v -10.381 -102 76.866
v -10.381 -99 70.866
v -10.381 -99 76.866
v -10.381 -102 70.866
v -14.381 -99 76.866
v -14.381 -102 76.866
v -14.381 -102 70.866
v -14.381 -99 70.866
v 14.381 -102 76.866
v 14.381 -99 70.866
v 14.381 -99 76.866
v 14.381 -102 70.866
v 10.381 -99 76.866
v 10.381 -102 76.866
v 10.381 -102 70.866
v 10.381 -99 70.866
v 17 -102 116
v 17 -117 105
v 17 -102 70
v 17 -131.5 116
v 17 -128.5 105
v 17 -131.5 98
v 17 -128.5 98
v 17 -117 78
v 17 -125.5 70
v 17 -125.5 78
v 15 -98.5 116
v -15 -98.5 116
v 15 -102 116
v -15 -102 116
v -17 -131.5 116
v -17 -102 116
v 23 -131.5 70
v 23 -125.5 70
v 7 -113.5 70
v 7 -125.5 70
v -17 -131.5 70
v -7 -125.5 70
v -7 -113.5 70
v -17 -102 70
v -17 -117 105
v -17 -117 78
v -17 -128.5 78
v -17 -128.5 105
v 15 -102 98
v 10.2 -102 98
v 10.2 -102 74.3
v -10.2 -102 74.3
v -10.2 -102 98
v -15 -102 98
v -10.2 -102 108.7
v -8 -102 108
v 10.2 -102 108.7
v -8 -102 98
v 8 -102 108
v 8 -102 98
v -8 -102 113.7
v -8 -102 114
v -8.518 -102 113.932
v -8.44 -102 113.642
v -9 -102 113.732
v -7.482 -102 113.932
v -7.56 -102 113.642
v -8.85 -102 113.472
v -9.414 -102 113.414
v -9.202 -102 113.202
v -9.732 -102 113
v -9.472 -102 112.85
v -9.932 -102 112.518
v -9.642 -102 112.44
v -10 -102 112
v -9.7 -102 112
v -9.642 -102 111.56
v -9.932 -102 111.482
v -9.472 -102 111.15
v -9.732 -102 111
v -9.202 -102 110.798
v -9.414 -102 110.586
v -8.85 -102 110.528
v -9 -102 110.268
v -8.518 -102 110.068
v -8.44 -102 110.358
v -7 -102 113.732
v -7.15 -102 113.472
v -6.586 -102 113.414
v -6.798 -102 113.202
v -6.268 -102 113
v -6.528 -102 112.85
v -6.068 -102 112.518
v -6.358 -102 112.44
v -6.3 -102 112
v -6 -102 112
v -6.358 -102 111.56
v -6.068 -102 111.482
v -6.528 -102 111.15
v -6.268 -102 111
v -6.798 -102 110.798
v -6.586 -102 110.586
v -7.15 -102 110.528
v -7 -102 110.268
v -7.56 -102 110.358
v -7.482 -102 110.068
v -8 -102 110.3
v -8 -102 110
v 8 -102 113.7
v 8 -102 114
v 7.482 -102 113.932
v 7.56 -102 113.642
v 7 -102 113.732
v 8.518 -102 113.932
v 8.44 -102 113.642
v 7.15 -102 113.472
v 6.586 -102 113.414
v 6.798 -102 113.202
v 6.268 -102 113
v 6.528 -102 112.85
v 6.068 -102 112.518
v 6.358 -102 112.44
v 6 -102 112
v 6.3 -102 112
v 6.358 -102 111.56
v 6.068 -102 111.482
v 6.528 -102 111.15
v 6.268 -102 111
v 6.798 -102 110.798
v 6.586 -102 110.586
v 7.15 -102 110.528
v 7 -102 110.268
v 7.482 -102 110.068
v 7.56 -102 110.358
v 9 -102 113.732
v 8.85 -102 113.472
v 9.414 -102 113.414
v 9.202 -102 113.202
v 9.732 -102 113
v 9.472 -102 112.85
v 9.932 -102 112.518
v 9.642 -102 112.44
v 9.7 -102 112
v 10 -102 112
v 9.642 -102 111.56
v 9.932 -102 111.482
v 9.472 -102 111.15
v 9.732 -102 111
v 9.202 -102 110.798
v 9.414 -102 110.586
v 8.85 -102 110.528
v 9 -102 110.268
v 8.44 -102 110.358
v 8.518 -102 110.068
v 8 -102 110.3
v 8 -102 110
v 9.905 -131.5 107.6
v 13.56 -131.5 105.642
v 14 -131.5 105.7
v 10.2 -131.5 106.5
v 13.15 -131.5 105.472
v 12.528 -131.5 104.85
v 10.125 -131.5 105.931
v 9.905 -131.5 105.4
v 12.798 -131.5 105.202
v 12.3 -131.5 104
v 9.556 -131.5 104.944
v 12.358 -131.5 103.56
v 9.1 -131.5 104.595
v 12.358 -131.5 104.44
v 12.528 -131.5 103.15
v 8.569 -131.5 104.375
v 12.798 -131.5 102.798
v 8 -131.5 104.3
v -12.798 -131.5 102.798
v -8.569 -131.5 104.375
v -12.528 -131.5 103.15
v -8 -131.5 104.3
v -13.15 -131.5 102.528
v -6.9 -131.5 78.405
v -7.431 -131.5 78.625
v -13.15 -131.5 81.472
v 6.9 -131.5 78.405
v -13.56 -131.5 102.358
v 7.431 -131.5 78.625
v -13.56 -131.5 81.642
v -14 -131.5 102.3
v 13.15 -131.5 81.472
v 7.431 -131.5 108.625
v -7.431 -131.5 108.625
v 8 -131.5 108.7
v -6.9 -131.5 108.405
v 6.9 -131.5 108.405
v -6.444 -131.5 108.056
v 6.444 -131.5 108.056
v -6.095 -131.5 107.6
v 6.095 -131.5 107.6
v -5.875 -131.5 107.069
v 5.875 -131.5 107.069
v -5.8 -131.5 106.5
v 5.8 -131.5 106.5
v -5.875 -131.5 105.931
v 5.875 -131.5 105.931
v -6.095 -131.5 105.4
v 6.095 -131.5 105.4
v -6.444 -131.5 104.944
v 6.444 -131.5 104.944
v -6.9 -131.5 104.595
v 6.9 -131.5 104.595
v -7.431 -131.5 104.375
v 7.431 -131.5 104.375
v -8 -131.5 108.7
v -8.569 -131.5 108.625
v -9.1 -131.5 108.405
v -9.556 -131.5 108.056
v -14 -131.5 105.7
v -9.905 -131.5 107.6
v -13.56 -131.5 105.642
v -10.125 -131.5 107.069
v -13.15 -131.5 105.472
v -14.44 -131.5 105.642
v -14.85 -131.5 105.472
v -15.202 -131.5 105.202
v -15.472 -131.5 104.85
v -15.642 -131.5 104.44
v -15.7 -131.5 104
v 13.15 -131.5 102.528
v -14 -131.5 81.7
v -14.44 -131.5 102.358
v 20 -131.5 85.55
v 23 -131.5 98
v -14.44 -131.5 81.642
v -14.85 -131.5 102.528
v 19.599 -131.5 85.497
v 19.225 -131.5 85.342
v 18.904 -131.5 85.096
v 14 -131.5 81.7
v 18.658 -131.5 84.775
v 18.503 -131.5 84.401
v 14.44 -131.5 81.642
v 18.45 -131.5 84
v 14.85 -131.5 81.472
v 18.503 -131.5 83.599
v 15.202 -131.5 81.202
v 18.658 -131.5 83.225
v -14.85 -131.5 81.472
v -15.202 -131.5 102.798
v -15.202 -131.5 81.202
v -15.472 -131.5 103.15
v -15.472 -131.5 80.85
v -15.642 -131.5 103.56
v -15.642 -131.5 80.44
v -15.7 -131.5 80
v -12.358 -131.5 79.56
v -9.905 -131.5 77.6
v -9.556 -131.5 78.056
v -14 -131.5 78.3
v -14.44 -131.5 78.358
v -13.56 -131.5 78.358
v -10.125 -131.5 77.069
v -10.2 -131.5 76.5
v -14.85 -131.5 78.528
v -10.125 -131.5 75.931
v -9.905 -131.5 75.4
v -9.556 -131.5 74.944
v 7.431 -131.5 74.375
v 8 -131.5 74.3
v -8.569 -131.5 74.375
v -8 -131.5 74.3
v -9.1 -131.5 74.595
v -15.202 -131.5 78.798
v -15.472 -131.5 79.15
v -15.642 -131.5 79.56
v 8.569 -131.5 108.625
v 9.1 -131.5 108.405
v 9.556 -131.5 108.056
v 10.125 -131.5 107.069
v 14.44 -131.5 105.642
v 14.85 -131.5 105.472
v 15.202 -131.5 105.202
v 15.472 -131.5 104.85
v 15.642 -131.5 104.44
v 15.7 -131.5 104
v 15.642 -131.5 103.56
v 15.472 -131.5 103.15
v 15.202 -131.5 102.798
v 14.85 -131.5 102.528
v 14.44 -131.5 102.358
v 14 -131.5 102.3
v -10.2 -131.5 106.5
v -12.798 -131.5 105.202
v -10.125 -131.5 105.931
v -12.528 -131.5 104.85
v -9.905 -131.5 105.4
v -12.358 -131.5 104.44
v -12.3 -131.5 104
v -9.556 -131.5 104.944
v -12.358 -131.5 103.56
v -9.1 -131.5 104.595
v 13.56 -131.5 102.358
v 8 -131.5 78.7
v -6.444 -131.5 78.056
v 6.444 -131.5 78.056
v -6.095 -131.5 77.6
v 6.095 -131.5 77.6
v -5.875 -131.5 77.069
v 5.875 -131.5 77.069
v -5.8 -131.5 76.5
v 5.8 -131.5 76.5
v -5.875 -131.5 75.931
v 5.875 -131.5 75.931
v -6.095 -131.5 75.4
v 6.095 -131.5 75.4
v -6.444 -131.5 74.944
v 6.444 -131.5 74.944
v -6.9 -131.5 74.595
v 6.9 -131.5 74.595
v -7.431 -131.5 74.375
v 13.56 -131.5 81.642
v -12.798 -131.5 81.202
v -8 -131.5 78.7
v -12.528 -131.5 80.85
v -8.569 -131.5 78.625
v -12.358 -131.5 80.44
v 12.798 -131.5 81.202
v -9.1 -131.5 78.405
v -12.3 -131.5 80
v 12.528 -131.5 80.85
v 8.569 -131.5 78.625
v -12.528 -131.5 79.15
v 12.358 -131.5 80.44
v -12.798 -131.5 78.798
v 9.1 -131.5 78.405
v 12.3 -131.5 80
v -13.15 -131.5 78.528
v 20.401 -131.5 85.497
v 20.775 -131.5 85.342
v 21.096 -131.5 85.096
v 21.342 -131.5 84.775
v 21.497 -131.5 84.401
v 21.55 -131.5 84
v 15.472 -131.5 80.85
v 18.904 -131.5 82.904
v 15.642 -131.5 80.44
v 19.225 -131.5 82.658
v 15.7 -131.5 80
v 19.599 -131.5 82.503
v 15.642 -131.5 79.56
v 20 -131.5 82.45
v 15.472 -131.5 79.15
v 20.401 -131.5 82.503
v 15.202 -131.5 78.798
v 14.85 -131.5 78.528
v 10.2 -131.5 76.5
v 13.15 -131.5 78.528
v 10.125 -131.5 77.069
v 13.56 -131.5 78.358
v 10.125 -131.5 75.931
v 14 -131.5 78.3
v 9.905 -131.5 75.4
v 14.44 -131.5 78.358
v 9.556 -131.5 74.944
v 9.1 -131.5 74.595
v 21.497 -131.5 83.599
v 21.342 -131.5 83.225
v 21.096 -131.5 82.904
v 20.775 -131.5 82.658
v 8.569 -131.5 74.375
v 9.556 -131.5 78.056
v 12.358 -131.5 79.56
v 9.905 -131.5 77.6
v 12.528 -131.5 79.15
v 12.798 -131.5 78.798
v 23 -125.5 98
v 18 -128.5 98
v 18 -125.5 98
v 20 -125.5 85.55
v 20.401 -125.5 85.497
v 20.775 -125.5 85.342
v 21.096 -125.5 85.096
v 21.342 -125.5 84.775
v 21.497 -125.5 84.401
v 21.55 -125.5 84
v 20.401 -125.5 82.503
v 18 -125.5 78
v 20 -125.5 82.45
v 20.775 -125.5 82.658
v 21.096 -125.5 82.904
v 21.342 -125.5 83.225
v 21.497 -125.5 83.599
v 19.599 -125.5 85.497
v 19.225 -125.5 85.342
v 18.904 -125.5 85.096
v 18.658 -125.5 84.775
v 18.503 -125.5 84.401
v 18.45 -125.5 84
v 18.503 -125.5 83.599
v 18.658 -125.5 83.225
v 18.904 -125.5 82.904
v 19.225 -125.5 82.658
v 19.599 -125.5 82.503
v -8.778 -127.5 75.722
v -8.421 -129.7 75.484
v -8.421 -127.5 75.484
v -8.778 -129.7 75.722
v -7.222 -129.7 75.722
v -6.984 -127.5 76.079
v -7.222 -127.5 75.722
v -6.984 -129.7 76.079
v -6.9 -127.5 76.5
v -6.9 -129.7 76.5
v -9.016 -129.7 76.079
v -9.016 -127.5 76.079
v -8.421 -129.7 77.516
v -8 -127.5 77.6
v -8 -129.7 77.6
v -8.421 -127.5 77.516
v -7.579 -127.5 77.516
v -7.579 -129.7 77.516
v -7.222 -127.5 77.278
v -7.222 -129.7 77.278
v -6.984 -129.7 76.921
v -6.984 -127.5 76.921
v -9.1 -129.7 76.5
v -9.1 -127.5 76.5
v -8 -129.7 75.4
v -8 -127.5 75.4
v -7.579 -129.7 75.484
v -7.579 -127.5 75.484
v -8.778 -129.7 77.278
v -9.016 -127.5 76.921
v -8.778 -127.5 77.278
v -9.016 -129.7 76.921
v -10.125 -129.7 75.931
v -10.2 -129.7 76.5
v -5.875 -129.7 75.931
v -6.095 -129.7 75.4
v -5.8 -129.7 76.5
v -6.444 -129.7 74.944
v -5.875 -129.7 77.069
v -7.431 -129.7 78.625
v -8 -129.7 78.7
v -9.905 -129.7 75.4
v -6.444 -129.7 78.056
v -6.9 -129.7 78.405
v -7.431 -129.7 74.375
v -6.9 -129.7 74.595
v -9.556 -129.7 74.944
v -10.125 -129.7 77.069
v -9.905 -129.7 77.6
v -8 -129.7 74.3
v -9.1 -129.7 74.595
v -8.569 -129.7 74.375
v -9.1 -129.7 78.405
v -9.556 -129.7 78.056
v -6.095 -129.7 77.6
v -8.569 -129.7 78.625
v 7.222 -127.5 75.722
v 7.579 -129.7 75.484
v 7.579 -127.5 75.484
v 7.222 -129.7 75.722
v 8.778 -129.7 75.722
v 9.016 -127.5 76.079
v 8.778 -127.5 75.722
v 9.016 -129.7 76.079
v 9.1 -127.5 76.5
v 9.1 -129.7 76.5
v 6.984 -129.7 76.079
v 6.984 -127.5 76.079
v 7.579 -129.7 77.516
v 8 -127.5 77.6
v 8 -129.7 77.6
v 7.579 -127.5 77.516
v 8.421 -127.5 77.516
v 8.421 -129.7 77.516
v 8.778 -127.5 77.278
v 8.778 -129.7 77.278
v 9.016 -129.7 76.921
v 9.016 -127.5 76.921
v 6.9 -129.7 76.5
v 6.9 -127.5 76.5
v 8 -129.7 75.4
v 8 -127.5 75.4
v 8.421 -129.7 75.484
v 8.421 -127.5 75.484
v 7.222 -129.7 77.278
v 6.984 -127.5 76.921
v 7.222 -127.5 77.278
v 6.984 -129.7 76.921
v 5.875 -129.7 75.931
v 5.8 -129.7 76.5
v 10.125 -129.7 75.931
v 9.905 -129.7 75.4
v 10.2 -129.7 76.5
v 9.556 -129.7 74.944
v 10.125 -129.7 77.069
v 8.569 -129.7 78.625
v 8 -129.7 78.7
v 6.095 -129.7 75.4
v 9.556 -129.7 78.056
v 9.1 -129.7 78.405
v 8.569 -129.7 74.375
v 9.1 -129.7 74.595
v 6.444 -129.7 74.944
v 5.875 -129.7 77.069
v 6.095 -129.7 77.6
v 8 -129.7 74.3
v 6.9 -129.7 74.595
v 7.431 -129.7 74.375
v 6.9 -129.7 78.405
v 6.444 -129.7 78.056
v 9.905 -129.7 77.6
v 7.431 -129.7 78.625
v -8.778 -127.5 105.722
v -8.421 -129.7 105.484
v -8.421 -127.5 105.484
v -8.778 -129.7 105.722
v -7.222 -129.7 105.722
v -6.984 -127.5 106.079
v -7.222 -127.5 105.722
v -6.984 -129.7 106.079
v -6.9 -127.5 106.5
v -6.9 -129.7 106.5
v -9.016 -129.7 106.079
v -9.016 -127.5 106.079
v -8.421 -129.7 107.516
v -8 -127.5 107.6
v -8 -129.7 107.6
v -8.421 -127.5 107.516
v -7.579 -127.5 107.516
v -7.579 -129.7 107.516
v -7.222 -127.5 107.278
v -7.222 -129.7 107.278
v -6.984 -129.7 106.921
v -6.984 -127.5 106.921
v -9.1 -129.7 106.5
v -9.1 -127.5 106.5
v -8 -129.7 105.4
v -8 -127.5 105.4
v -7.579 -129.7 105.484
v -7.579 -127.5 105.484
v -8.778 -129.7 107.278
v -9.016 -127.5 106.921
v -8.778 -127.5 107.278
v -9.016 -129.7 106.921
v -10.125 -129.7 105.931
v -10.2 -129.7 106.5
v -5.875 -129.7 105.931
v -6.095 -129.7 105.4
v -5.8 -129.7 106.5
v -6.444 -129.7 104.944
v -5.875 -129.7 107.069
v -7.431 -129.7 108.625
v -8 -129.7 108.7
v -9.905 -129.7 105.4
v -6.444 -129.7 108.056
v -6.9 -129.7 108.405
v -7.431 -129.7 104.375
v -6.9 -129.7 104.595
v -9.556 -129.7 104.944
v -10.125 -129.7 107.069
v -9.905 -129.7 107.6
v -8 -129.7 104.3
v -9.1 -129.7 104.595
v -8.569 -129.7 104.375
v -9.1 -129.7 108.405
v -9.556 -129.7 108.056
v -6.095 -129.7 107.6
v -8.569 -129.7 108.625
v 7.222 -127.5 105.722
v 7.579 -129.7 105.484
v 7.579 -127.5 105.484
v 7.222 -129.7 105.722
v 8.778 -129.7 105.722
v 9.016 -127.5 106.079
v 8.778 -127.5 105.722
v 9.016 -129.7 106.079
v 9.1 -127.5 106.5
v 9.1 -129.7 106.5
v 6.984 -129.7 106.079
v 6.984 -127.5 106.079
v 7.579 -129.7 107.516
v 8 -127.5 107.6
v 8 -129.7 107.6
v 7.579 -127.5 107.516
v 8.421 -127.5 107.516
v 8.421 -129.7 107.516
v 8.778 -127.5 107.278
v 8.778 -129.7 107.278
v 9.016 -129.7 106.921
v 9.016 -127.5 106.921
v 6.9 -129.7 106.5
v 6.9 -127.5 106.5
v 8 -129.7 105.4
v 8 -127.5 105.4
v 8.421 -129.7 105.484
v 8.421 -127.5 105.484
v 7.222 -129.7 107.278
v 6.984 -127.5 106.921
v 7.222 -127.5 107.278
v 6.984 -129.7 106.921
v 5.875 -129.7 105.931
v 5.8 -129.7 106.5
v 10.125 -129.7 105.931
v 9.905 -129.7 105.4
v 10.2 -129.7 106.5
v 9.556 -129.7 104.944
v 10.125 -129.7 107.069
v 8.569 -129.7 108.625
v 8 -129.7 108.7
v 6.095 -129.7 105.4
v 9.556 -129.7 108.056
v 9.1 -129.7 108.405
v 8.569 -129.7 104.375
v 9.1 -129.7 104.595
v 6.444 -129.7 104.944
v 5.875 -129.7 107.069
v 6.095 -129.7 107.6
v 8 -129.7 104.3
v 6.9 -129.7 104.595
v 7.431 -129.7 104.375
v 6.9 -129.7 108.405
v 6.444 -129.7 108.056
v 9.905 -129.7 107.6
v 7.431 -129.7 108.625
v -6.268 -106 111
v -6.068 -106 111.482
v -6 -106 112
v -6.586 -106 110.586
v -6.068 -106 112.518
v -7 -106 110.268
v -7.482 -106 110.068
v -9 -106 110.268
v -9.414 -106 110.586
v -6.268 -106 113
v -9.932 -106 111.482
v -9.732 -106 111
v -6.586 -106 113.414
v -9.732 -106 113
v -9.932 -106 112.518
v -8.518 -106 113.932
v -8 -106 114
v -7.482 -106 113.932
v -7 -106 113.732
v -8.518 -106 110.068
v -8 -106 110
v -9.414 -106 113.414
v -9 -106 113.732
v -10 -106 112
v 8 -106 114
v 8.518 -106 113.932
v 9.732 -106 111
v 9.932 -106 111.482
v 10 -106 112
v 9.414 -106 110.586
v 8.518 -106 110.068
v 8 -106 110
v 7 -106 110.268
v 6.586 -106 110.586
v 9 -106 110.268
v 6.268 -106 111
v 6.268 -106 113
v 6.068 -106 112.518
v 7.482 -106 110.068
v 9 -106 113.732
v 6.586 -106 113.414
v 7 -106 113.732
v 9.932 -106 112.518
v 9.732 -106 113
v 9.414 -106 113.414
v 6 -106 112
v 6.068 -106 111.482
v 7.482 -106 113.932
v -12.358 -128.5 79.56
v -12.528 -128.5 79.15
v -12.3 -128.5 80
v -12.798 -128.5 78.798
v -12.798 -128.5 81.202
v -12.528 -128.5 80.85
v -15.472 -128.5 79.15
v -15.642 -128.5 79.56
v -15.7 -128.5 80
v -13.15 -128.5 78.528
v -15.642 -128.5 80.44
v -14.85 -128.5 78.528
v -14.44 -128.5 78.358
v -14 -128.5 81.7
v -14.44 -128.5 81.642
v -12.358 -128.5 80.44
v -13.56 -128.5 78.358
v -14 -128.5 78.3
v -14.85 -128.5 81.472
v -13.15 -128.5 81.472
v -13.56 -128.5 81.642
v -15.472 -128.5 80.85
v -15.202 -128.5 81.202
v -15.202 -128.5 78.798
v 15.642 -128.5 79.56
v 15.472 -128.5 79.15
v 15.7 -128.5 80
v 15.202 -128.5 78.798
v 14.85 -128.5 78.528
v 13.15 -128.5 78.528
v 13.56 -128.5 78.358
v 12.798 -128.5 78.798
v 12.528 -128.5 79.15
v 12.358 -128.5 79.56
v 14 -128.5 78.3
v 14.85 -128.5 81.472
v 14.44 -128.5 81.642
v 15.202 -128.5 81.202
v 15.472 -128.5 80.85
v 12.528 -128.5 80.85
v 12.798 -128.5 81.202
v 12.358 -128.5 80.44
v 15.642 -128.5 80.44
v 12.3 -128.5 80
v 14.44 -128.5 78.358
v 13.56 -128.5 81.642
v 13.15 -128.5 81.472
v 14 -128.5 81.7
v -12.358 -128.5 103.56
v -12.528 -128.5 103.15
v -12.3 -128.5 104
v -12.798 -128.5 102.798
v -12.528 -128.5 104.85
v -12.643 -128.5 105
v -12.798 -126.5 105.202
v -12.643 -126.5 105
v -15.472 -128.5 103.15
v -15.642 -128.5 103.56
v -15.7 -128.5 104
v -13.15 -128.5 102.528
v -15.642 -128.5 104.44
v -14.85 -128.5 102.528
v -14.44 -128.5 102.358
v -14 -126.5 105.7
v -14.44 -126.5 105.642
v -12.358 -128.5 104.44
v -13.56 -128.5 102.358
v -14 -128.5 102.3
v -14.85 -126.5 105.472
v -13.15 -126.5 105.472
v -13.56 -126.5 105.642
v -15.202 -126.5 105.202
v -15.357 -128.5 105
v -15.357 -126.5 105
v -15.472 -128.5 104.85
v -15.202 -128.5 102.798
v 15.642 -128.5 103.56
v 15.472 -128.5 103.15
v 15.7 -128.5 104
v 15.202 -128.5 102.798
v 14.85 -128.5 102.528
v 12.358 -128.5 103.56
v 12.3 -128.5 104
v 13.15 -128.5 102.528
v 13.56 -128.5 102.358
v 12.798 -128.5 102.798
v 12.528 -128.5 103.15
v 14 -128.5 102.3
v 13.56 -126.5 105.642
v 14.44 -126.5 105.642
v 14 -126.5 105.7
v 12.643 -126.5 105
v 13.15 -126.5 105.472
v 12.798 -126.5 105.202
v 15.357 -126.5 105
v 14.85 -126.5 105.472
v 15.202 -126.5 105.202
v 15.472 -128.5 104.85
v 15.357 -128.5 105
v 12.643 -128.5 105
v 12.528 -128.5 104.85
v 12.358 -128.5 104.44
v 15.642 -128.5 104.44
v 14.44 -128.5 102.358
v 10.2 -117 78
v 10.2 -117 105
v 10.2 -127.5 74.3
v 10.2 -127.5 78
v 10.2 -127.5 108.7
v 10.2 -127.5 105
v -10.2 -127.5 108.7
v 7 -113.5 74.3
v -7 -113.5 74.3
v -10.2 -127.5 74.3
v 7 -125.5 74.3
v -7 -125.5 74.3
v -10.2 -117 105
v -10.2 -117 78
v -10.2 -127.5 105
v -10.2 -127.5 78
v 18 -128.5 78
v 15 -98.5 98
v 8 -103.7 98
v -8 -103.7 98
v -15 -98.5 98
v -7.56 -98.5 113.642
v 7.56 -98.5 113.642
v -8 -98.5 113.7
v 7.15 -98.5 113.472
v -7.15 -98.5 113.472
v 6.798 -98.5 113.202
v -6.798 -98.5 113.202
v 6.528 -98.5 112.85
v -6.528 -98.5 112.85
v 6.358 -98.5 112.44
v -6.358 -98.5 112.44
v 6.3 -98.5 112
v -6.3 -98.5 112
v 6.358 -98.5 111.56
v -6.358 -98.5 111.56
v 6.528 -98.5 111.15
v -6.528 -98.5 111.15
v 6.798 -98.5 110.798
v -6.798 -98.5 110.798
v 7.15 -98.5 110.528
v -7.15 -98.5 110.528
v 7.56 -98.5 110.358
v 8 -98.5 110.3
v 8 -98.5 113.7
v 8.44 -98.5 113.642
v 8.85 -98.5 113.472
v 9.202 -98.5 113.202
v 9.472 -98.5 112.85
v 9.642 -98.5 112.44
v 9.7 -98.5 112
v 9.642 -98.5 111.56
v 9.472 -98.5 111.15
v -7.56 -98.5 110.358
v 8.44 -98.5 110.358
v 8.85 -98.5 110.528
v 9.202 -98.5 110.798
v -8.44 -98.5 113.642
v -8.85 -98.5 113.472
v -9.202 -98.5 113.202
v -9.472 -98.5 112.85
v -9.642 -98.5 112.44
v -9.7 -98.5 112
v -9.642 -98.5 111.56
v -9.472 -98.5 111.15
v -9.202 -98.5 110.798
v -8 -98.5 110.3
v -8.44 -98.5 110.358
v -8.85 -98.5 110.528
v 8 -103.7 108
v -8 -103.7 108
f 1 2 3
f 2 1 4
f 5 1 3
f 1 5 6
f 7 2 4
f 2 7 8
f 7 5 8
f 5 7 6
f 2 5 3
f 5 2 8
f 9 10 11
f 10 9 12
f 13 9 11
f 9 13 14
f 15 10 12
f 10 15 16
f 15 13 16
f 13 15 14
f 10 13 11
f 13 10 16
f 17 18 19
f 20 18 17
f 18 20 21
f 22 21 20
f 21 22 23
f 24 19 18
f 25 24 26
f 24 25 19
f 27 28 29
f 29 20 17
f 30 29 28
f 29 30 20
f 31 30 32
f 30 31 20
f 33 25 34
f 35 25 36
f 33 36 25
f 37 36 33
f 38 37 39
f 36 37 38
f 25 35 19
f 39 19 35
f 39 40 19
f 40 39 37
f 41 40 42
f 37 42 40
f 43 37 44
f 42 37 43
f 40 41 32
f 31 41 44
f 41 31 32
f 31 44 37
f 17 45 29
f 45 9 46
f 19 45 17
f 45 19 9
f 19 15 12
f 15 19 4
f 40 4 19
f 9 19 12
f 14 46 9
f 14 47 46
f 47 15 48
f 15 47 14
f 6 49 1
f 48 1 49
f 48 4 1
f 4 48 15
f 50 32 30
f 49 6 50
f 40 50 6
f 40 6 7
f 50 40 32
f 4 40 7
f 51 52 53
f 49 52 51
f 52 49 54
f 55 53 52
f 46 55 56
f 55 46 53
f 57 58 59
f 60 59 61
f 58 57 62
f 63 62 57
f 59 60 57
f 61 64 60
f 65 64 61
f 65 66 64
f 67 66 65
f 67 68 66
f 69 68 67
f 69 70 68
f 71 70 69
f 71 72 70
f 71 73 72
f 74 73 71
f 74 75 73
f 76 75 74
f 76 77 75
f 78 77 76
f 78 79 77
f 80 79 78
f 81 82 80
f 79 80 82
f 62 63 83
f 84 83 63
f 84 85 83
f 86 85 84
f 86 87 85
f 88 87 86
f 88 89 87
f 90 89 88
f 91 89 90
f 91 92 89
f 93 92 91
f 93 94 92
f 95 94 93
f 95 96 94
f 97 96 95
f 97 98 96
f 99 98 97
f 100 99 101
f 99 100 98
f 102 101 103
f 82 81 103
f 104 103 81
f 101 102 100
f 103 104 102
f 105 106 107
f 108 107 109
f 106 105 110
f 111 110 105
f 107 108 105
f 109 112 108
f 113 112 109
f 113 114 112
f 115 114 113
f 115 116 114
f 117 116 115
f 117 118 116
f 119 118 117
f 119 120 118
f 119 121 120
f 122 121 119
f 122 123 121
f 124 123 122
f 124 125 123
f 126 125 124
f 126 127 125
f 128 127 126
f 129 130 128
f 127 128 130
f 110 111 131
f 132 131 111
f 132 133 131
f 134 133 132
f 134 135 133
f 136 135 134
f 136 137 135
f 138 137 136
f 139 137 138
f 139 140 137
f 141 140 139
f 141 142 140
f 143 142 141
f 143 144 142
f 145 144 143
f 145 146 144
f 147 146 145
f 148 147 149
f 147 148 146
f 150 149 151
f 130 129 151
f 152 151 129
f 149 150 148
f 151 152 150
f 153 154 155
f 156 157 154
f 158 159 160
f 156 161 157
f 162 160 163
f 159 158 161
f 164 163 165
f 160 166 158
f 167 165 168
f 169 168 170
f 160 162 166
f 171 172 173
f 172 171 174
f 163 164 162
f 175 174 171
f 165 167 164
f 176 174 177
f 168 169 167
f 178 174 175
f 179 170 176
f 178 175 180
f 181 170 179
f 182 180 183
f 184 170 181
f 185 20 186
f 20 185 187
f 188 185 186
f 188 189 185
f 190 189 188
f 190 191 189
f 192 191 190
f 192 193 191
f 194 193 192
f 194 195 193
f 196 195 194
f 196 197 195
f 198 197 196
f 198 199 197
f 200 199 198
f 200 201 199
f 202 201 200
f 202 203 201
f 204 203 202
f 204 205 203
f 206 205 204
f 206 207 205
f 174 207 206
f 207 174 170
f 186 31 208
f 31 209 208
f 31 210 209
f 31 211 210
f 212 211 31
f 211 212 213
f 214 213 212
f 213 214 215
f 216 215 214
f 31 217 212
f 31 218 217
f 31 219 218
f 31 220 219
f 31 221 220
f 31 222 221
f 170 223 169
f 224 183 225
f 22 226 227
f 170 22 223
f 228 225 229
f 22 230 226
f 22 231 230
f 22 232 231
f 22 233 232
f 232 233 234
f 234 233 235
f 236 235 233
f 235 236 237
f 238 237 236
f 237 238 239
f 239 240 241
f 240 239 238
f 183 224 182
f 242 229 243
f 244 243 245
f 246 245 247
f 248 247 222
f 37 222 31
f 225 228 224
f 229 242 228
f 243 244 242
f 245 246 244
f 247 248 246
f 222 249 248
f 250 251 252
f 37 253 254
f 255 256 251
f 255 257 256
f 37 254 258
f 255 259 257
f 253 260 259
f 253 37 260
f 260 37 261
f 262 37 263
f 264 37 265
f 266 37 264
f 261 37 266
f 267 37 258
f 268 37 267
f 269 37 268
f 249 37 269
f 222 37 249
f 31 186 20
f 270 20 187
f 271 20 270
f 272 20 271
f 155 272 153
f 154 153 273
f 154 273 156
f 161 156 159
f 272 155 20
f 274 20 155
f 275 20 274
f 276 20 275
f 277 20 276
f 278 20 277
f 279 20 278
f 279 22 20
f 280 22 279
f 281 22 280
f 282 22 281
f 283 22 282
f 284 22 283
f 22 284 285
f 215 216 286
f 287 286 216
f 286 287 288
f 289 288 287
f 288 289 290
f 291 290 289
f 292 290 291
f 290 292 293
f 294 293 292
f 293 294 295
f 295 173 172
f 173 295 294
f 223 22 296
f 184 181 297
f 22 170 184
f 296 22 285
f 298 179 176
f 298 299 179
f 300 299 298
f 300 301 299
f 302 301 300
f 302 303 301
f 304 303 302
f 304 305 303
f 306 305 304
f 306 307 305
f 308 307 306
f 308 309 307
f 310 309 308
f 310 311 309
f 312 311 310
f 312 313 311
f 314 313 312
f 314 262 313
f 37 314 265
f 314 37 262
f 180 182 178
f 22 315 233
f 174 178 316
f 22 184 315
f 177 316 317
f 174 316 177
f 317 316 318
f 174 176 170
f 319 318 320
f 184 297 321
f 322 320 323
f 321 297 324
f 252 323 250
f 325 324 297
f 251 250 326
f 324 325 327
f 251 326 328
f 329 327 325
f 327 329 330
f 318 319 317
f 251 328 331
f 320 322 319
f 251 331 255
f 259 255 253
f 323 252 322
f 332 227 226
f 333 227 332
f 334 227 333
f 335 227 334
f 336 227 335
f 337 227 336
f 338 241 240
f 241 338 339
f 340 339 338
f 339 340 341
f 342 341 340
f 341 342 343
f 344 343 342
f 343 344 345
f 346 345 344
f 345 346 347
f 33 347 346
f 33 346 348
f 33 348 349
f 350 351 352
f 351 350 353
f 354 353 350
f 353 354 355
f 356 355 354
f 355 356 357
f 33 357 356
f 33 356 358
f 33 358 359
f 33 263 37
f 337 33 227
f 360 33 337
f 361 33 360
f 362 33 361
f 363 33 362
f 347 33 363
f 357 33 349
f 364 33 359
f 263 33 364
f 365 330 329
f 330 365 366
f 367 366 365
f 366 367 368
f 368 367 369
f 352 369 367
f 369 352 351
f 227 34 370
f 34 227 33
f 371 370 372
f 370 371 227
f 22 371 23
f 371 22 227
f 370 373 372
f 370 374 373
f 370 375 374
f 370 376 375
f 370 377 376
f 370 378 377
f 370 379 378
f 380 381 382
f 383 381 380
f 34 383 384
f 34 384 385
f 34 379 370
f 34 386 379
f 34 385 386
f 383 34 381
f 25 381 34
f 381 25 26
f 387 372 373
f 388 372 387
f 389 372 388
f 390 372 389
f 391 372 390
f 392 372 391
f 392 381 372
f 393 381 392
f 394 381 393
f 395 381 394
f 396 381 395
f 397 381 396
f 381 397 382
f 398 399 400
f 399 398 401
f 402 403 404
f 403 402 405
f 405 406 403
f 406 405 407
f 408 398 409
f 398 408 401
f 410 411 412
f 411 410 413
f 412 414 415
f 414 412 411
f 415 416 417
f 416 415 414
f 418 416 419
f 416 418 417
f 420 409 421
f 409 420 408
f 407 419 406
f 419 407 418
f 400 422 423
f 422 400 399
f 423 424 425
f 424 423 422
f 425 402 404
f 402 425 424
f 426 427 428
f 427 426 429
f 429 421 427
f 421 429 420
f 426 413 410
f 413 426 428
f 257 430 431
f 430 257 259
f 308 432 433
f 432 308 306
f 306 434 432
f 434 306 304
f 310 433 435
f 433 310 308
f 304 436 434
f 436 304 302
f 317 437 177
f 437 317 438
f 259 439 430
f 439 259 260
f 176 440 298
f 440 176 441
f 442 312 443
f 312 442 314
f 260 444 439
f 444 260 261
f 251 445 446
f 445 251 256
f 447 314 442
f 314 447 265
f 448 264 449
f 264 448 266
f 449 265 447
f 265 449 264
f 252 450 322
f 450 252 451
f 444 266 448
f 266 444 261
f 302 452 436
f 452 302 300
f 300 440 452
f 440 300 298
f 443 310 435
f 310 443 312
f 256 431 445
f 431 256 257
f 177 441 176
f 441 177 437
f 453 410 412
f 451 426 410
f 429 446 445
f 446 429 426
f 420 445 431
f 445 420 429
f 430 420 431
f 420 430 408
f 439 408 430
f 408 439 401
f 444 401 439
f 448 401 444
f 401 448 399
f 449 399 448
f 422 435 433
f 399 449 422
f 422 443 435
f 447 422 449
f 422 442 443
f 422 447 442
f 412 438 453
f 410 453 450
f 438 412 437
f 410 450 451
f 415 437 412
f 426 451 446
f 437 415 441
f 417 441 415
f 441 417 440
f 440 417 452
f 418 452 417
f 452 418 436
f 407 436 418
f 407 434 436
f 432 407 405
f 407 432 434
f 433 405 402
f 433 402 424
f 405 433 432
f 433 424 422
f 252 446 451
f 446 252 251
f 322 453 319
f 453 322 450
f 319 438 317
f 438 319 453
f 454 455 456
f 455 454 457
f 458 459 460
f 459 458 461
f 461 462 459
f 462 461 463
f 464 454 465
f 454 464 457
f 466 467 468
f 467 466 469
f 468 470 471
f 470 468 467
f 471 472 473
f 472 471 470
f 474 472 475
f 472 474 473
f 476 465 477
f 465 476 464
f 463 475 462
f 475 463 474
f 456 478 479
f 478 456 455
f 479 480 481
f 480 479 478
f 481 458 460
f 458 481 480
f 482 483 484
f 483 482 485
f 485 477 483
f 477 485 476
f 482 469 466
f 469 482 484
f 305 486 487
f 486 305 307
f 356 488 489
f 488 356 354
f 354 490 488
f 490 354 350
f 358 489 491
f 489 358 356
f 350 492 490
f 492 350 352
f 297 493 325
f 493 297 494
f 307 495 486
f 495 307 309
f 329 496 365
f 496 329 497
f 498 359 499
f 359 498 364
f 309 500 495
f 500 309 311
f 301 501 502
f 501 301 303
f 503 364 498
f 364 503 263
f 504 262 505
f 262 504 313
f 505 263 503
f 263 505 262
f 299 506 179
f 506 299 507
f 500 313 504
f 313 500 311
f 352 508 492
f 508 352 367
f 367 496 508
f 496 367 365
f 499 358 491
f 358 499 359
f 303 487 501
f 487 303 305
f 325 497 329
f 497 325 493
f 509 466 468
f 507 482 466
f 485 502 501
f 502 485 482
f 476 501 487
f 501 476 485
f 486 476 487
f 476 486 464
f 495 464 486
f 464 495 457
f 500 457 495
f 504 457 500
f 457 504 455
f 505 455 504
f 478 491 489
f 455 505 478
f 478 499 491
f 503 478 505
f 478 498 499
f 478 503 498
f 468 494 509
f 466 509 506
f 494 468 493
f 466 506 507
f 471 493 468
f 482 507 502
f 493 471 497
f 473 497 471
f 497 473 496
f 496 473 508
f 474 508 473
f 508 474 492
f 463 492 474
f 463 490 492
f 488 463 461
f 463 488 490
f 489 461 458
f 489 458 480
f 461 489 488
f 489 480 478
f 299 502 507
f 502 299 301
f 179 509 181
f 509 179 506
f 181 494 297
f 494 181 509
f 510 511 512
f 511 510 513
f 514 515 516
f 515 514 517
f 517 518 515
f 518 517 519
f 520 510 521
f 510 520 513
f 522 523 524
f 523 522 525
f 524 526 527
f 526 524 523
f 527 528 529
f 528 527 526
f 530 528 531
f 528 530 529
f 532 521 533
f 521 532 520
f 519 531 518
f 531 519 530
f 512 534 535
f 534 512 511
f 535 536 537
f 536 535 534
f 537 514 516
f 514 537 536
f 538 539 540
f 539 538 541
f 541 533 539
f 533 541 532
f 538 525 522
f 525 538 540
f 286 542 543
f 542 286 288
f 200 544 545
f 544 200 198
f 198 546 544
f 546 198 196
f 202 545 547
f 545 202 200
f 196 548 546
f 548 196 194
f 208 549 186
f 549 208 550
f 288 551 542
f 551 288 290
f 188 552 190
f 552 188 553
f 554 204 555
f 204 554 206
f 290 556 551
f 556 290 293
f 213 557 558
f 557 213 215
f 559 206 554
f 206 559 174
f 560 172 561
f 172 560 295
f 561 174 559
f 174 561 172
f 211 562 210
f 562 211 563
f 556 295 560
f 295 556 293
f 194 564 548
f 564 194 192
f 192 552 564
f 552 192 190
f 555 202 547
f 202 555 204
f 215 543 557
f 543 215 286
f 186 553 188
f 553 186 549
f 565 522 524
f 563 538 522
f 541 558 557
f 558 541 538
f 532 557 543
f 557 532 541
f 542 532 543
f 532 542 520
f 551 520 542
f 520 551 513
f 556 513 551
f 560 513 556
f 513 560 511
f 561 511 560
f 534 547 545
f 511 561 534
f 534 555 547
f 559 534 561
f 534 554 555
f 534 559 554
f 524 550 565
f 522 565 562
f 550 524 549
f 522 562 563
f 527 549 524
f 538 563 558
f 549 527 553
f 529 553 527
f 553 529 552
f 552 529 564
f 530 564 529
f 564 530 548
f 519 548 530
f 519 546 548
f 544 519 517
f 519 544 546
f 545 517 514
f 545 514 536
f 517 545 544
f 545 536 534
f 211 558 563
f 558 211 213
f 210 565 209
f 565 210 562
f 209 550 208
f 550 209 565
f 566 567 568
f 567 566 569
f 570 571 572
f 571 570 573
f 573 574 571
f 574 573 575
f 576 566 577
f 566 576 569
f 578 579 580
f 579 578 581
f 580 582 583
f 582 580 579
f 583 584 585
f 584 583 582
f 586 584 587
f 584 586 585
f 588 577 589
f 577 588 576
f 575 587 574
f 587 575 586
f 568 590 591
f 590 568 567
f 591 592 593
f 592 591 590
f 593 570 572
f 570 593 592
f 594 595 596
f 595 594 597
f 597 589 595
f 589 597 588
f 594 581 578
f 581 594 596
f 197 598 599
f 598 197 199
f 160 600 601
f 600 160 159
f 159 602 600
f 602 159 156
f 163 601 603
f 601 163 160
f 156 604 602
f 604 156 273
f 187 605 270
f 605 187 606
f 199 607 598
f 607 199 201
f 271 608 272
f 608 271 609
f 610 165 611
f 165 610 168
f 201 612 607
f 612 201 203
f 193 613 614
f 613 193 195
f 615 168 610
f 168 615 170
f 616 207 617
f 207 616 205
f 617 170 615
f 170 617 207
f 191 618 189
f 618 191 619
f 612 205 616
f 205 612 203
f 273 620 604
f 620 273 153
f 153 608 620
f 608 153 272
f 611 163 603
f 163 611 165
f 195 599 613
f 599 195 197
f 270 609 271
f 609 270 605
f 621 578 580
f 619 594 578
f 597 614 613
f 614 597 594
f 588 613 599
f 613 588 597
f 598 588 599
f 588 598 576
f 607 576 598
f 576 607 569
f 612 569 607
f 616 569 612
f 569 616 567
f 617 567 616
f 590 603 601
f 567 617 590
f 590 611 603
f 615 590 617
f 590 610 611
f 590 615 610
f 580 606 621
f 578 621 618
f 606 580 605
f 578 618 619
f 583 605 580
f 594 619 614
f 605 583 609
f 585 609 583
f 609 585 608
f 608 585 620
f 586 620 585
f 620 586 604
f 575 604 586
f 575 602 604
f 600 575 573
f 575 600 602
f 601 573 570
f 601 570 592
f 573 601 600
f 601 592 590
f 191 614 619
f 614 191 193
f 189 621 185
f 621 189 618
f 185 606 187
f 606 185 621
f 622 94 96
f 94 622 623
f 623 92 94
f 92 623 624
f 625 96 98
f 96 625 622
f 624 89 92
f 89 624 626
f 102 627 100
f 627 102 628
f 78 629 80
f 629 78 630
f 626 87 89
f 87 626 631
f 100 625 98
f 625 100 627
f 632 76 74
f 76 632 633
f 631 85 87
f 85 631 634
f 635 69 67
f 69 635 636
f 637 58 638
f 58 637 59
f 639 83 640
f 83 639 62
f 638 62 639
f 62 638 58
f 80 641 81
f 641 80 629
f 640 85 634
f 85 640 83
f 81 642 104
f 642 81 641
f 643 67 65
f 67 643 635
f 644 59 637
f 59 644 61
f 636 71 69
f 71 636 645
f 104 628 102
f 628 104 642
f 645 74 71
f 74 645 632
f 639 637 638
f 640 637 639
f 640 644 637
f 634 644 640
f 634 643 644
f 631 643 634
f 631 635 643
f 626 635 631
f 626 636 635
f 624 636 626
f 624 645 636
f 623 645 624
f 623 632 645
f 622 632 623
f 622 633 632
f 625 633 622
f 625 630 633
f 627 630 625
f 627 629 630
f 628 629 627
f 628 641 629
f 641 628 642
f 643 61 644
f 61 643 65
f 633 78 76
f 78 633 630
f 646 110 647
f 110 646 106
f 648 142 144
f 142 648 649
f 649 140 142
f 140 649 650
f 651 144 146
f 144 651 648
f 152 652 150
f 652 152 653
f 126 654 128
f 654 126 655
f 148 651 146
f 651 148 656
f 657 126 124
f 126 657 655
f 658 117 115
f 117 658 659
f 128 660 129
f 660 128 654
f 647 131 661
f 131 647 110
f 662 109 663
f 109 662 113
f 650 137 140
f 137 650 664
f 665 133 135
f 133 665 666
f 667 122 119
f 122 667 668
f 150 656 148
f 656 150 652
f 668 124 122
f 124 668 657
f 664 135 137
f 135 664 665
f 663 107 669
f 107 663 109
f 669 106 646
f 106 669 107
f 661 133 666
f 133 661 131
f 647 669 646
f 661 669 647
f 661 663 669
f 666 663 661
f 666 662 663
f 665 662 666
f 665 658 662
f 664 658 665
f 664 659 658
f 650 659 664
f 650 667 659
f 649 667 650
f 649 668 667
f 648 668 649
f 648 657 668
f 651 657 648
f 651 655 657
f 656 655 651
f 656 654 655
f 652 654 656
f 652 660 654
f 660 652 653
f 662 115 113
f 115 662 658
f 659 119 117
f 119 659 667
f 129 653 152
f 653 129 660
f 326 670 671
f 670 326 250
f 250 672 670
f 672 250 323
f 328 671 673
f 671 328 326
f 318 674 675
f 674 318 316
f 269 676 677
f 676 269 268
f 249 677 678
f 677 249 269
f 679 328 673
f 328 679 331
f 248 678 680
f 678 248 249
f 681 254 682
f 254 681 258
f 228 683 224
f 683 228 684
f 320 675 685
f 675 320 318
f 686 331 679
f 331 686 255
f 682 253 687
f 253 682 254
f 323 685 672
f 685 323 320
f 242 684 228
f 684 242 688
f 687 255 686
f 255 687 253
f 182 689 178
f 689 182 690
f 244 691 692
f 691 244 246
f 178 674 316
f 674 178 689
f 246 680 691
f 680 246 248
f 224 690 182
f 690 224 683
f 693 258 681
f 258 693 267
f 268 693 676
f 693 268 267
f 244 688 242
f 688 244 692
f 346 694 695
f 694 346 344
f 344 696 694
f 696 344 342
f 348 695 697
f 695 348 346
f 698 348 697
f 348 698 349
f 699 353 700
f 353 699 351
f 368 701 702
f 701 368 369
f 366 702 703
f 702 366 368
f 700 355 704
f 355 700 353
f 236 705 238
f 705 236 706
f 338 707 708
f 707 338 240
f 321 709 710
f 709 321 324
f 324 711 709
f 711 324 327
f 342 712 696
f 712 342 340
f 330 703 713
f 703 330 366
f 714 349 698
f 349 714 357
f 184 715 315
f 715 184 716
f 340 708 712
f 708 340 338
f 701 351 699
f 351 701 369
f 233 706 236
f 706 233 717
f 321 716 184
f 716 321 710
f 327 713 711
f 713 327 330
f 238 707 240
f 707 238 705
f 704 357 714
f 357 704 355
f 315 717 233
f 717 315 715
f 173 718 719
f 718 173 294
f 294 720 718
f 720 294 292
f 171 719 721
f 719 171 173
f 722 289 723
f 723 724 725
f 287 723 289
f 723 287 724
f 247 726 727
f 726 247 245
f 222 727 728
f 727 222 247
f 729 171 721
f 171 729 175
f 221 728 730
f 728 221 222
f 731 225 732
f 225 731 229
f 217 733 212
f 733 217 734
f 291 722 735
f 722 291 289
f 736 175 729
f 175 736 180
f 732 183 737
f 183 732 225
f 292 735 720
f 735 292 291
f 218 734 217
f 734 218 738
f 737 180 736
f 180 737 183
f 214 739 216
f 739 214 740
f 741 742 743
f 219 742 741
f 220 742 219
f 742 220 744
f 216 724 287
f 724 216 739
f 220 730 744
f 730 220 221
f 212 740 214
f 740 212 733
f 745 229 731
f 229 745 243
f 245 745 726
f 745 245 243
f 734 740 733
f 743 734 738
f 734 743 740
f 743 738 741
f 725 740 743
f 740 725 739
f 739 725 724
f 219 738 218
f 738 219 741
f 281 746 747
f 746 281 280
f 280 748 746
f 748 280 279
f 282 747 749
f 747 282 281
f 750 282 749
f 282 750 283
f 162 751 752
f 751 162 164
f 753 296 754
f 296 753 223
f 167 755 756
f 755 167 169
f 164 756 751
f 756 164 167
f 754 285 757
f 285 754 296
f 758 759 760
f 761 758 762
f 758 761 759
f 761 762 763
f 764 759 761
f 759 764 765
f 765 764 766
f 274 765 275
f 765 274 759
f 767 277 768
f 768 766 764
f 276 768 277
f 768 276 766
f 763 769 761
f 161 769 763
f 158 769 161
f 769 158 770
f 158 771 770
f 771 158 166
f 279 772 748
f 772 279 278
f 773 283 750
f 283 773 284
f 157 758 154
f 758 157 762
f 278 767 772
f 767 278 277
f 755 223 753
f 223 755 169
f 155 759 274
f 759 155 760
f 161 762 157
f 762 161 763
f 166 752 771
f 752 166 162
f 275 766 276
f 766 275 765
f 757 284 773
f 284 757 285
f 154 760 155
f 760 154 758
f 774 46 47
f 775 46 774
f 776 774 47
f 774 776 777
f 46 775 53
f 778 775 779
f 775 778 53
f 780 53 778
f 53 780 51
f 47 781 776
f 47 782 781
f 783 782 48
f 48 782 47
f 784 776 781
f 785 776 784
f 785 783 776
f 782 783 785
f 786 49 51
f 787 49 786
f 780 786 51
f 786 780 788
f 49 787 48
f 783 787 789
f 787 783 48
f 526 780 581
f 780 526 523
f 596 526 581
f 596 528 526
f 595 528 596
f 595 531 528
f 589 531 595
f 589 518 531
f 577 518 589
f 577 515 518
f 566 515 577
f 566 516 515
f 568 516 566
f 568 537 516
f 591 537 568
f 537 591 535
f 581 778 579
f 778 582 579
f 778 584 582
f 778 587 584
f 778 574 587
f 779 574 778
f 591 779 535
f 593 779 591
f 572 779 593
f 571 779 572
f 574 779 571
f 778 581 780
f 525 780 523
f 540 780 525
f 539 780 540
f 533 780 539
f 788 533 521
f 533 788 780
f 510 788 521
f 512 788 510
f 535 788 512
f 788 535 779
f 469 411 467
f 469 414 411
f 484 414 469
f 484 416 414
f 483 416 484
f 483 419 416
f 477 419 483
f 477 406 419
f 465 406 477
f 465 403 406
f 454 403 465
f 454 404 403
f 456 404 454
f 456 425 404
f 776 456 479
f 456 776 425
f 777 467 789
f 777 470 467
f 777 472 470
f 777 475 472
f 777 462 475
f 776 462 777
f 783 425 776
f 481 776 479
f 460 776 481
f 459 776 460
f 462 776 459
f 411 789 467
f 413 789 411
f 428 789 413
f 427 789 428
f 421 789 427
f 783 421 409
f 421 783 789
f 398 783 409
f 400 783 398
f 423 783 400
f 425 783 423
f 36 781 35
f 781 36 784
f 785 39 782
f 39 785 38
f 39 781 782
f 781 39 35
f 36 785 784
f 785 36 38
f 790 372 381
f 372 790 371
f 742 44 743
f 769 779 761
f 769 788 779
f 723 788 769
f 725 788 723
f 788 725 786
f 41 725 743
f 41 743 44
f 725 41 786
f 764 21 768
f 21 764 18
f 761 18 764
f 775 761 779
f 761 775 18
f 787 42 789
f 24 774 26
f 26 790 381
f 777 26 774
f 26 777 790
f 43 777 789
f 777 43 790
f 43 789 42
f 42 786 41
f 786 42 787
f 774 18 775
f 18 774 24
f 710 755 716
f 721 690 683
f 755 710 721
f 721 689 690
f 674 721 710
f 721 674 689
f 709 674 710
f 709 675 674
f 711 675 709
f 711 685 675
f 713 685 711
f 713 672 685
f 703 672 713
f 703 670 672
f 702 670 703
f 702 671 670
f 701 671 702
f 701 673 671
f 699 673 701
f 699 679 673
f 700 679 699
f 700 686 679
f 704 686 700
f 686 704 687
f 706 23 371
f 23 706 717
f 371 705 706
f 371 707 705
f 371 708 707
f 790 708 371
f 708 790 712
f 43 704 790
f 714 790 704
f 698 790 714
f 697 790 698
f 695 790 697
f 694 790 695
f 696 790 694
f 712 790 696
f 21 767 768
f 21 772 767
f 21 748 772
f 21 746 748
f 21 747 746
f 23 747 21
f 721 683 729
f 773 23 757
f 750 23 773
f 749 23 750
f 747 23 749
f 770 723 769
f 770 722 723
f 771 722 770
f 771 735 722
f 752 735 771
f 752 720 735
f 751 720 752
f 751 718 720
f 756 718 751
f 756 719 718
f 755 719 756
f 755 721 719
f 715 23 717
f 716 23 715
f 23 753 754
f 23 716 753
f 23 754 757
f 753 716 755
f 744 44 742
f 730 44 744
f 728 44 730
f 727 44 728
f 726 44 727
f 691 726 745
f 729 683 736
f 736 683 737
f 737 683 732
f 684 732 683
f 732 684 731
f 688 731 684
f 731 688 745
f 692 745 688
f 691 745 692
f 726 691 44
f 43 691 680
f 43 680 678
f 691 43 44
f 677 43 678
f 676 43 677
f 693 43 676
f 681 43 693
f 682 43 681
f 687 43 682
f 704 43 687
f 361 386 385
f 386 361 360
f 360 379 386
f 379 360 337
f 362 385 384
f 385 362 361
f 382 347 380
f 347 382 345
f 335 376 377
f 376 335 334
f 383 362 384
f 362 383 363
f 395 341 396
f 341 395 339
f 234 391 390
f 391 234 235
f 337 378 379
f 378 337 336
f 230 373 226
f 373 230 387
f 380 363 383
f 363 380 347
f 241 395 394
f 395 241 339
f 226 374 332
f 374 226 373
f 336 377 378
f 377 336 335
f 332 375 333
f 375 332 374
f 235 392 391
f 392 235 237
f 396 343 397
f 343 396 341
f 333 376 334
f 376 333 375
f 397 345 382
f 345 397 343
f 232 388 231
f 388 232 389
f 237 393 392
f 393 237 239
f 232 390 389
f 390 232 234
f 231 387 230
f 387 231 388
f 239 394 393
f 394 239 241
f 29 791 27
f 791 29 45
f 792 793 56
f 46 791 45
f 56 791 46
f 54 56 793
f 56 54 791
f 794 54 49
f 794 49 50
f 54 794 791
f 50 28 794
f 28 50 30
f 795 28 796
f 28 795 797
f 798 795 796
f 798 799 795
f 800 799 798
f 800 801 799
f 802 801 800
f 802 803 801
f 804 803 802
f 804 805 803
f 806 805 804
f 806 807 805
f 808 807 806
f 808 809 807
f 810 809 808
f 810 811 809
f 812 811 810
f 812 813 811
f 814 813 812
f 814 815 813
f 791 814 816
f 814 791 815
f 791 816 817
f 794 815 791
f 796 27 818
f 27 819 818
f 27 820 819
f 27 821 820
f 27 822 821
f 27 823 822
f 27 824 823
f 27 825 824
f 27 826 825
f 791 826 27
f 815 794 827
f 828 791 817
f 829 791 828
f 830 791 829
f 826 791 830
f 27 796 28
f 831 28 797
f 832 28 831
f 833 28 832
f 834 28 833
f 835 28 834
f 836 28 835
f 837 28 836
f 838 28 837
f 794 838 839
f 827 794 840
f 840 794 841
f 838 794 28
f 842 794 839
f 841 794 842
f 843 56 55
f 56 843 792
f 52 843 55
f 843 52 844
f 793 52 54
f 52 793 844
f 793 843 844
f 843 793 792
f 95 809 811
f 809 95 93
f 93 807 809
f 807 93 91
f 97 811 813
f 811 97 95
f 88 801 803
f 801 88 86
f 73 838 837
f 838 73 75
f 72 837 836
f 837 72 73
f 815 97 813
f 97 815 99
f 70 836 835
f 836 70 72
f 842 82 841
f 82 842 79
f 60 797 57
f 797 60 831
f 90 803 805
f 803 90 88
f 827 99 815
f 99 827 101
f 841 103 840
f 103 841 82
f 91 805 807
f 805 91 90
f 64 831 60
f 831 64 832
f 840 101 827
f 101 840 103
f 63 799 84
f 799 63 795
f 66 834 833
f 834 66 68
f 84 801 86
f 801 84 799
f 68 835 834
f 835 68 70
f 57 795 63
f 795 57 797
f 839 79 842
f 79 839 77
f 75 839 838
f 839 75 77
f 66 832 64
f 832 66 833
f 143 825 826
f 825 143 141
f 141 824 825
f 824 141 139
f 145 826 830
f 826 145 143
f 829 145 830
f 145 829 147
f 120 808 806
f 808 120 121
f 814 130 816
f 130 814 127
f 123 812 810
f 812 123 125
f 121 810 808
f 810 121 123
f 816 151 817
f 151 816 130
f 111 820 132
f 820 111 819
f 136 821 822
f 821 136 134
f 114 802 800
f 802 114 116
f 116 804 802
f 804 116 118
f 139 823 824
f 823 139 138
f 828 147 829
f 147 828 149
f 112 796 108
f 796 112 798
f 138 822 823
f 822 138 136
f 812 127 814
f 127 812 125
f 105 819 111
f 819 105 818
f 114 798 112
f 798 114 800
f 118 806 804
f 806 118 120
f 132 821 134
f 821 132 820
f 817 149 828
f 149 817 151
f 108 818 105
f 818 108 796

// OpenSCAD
// =====================================================================
//  p13_p14_servo_cradle.scad - P13 servo cradle (XL330-M288-T) and P14 servo strap
//  PROJECT SCRATCH · 05-engineering/cad/frame · units: mm · frame: global (section 2)
//  Sources: mechanical.md section 5.3 (pocket 20.4 x 34.4 x 23.5, 2.5 walls, open at the horn face +Y and the cable
//  end, strap, TPU bumpers at +/-32 deg, zero-pin bore 3.1), 11 P13/P14, and bom-verified.md section 11 (Director,
//  rev 2): the XL330 has NO side holes; it mounts through its four back-face holes (16 x 30, diam 1.6, 4.5 deep) with
//  M2 x 6 tapping screws through the 2.5 mm back wall (3.5 mm engagement; M2 x 8 bottoms out); the JST connectors
//  sit on both 23 x 34 side faces 13..24 mm behind the horn face, so both side walls have windows there; the output
//  axis is 9.5 mm from the body end (body Z 74.5..108.5).  PART = "cradle" | "strap" | "both".  Print horn face up.
//  Cradle X +/-17 (the four M3 leg screws at (+/-14, 80 / 104) clear the servo pattern), Y -130..-102 (ends 1 mm
//  short of the P16 disc), Z 70..116 (46 tall: the top wall carries the strap inserts, C-S1).  Cable end = a 14 x 12
//  window in the bottom wall.  Zero-pin flange on +X (X 17..23).
//  Bumper lugs at 50.7 deg so a 2 mm TPU pad on their trailing face meets the cheek lug at 32 deg (C-S2).
//  Strap P14 lies across the open +Y face above the horn (Y -102..-98.5, Z 98..116) with a pad reaching 0.3 mm
//  into the servo's front face; 30 x 3.5 x 18 vs section 11's 30 x 4 x 10 (C-S3).
// =====================================================================
include <lib_sp1.scad>
PART = "both";
// rev 3 (crown mount): the back face (plane Y -131.5, X +/-17, Z 70..116) is the crown's bolt interface: back wall 4.0 thick,
// the four servo M2 x 6 heads counterbored diam 4.4 x 1.8 flush with it (3.8 mm engagement); crown holes 4 x M3 at (+/-14, 80 / 104).
X0 = -17;  X1 = 17;  Y0 = -131.5;  Y1 = -102;  Z0 = 70;  Z1 = 116;  BACK = 4.0;  SERVO_CB_D = 4.4;  SERVO_CB_H = 1.8;
BODY_Z0 = SERVO[4] - 0.2;  BODY_ZC = (SERVO[4] + SERVO[5]) / 2;
CABLE_WIN = [14, 12];  SERVO_SCREW_D = 2.2;  CONN_WIN_Z = [78, 105];
LUG_R = 16;  LUG_ANG = 50.7;  LUG_SX = 4;  LUG_SZ = 6;  LUG_Y0 = -103;  LUG_Y1 = -99;  BUMPER_T = 2;
FLANGE_X1 = 23;  FLANGE_Z0 = 70;  FLANGE_Z1 = 98;  ZERO_PIN = [20, 84];  ZERO_PIN_D = 3.1;
STRAP_INS = [[-8, 112], [8, 112]];
MOUNT = [[-14, 80], [14, 80], [-14, 104], [14, 104]];      // = P11 FOOT_INS

module p13_servo_cradle() difference() {
    union() {
        box(X0, X1, Y0, Y1, Z0, Z1);
        box(X1 - 0.01, FLANGE_X1, Y0, Y0 + 6, FLANGE_Z0, FLANGE_Z1);                                  // zero-pin flange
        for (s = [-1, 1]) cbox(AXIS_X + s * LUG_R * sin(LUG_ANG), (LUG_Y0 + LUG_Y1) / 2, AXIS_Z - LUG_R * cos(LUG_ANG), LUG_SX, LUG_Y1 - LUG_Y0, LUG_SZ);   // bumper lugs
    }
    xl330_pocket(0, Y0 + BACK, BODY_Z0);
    box(-CABLE_WIN[0] / 2, CABLE_WIN[0] / 2, Y0 + BACK + 2, Y0 + BACK + 2 + CABLE_WIN[1], Z0 - 1, BODY_Z0 + 1);   // cable window (bottom)
    for (h = XL330_FRAME_HOLES) {                                                                                  // 4 x M2 x 6 into the servo's back-face holes
        cyl_y(SERVO_SCREW_D / 2, Y0 - 1, Y0 + BACK + 1, h[0], BODY_ZC + h[1], fn = 16);
        cyl_y(SERVO_CB_D / 2, Y0 - 1, Y0 + SERVO_CB_H, h[0], BODY_ZC + h[1], fn = 24);                                // head counterbore, flush with the crown face
    }
    box(X0 - 1, X1 + 1, HORN_Y[0] - XL330_CONN[1] - 0.5, HORN_Y[0] - XL330_CONN[0], CONN_WIN_Z[0], CONN_WIN_Z[1]);   // connector windows, both side walls
    cyl_y(ZERO_PIN_D / 2, Y0 - 1, Y1 + 1, ZERO_PIN[0], ZERO_PIN[1], fn = 24);
    for (h = STRAP_INS) ins_y(M3_INS_D, M3_INS_L, h[0], h[1], Y1, -1);                                 // strap inserts in the top wall's +Y end
    for (h = MOUNT) cyl_y(M3_CLEAR / 2, Y0 - 1, Y0 + BACK + 1, h[0], h[1], fn = 24);                   // 4 x M3 through the back into P11
}

S_X = 30;  S_T = 3.5;  S_Z0 = 98;  S_Z1 = 116;  S_Y1 = Y1 + 3.5;  INTERF = 0.3;
module p14_servo_strap() difference() {
    union() {
        box(-S_X / 2, S_X / 2, S_Y1 - S_T, S_Y1, S_Z0, S_Z1);
        box(-8, 8, HORN_Y[0] + INTERF, S_Y1 - S_T + 0.01, S_Z0, 108);                                  // pad into the pocket (0.3 interference)
    }
    for (h = STRAP_INS) cyl_y(M3_CLEAR / 2, S_Y1 - S_T - 1, S_Y1 + 1, h[0], h[1], fn = 24);
}
if (PART == "cradle" || PART == "both") p13_servo_cradle();
if (PART == "strap" || PART == "both") p14_servo_strap();
